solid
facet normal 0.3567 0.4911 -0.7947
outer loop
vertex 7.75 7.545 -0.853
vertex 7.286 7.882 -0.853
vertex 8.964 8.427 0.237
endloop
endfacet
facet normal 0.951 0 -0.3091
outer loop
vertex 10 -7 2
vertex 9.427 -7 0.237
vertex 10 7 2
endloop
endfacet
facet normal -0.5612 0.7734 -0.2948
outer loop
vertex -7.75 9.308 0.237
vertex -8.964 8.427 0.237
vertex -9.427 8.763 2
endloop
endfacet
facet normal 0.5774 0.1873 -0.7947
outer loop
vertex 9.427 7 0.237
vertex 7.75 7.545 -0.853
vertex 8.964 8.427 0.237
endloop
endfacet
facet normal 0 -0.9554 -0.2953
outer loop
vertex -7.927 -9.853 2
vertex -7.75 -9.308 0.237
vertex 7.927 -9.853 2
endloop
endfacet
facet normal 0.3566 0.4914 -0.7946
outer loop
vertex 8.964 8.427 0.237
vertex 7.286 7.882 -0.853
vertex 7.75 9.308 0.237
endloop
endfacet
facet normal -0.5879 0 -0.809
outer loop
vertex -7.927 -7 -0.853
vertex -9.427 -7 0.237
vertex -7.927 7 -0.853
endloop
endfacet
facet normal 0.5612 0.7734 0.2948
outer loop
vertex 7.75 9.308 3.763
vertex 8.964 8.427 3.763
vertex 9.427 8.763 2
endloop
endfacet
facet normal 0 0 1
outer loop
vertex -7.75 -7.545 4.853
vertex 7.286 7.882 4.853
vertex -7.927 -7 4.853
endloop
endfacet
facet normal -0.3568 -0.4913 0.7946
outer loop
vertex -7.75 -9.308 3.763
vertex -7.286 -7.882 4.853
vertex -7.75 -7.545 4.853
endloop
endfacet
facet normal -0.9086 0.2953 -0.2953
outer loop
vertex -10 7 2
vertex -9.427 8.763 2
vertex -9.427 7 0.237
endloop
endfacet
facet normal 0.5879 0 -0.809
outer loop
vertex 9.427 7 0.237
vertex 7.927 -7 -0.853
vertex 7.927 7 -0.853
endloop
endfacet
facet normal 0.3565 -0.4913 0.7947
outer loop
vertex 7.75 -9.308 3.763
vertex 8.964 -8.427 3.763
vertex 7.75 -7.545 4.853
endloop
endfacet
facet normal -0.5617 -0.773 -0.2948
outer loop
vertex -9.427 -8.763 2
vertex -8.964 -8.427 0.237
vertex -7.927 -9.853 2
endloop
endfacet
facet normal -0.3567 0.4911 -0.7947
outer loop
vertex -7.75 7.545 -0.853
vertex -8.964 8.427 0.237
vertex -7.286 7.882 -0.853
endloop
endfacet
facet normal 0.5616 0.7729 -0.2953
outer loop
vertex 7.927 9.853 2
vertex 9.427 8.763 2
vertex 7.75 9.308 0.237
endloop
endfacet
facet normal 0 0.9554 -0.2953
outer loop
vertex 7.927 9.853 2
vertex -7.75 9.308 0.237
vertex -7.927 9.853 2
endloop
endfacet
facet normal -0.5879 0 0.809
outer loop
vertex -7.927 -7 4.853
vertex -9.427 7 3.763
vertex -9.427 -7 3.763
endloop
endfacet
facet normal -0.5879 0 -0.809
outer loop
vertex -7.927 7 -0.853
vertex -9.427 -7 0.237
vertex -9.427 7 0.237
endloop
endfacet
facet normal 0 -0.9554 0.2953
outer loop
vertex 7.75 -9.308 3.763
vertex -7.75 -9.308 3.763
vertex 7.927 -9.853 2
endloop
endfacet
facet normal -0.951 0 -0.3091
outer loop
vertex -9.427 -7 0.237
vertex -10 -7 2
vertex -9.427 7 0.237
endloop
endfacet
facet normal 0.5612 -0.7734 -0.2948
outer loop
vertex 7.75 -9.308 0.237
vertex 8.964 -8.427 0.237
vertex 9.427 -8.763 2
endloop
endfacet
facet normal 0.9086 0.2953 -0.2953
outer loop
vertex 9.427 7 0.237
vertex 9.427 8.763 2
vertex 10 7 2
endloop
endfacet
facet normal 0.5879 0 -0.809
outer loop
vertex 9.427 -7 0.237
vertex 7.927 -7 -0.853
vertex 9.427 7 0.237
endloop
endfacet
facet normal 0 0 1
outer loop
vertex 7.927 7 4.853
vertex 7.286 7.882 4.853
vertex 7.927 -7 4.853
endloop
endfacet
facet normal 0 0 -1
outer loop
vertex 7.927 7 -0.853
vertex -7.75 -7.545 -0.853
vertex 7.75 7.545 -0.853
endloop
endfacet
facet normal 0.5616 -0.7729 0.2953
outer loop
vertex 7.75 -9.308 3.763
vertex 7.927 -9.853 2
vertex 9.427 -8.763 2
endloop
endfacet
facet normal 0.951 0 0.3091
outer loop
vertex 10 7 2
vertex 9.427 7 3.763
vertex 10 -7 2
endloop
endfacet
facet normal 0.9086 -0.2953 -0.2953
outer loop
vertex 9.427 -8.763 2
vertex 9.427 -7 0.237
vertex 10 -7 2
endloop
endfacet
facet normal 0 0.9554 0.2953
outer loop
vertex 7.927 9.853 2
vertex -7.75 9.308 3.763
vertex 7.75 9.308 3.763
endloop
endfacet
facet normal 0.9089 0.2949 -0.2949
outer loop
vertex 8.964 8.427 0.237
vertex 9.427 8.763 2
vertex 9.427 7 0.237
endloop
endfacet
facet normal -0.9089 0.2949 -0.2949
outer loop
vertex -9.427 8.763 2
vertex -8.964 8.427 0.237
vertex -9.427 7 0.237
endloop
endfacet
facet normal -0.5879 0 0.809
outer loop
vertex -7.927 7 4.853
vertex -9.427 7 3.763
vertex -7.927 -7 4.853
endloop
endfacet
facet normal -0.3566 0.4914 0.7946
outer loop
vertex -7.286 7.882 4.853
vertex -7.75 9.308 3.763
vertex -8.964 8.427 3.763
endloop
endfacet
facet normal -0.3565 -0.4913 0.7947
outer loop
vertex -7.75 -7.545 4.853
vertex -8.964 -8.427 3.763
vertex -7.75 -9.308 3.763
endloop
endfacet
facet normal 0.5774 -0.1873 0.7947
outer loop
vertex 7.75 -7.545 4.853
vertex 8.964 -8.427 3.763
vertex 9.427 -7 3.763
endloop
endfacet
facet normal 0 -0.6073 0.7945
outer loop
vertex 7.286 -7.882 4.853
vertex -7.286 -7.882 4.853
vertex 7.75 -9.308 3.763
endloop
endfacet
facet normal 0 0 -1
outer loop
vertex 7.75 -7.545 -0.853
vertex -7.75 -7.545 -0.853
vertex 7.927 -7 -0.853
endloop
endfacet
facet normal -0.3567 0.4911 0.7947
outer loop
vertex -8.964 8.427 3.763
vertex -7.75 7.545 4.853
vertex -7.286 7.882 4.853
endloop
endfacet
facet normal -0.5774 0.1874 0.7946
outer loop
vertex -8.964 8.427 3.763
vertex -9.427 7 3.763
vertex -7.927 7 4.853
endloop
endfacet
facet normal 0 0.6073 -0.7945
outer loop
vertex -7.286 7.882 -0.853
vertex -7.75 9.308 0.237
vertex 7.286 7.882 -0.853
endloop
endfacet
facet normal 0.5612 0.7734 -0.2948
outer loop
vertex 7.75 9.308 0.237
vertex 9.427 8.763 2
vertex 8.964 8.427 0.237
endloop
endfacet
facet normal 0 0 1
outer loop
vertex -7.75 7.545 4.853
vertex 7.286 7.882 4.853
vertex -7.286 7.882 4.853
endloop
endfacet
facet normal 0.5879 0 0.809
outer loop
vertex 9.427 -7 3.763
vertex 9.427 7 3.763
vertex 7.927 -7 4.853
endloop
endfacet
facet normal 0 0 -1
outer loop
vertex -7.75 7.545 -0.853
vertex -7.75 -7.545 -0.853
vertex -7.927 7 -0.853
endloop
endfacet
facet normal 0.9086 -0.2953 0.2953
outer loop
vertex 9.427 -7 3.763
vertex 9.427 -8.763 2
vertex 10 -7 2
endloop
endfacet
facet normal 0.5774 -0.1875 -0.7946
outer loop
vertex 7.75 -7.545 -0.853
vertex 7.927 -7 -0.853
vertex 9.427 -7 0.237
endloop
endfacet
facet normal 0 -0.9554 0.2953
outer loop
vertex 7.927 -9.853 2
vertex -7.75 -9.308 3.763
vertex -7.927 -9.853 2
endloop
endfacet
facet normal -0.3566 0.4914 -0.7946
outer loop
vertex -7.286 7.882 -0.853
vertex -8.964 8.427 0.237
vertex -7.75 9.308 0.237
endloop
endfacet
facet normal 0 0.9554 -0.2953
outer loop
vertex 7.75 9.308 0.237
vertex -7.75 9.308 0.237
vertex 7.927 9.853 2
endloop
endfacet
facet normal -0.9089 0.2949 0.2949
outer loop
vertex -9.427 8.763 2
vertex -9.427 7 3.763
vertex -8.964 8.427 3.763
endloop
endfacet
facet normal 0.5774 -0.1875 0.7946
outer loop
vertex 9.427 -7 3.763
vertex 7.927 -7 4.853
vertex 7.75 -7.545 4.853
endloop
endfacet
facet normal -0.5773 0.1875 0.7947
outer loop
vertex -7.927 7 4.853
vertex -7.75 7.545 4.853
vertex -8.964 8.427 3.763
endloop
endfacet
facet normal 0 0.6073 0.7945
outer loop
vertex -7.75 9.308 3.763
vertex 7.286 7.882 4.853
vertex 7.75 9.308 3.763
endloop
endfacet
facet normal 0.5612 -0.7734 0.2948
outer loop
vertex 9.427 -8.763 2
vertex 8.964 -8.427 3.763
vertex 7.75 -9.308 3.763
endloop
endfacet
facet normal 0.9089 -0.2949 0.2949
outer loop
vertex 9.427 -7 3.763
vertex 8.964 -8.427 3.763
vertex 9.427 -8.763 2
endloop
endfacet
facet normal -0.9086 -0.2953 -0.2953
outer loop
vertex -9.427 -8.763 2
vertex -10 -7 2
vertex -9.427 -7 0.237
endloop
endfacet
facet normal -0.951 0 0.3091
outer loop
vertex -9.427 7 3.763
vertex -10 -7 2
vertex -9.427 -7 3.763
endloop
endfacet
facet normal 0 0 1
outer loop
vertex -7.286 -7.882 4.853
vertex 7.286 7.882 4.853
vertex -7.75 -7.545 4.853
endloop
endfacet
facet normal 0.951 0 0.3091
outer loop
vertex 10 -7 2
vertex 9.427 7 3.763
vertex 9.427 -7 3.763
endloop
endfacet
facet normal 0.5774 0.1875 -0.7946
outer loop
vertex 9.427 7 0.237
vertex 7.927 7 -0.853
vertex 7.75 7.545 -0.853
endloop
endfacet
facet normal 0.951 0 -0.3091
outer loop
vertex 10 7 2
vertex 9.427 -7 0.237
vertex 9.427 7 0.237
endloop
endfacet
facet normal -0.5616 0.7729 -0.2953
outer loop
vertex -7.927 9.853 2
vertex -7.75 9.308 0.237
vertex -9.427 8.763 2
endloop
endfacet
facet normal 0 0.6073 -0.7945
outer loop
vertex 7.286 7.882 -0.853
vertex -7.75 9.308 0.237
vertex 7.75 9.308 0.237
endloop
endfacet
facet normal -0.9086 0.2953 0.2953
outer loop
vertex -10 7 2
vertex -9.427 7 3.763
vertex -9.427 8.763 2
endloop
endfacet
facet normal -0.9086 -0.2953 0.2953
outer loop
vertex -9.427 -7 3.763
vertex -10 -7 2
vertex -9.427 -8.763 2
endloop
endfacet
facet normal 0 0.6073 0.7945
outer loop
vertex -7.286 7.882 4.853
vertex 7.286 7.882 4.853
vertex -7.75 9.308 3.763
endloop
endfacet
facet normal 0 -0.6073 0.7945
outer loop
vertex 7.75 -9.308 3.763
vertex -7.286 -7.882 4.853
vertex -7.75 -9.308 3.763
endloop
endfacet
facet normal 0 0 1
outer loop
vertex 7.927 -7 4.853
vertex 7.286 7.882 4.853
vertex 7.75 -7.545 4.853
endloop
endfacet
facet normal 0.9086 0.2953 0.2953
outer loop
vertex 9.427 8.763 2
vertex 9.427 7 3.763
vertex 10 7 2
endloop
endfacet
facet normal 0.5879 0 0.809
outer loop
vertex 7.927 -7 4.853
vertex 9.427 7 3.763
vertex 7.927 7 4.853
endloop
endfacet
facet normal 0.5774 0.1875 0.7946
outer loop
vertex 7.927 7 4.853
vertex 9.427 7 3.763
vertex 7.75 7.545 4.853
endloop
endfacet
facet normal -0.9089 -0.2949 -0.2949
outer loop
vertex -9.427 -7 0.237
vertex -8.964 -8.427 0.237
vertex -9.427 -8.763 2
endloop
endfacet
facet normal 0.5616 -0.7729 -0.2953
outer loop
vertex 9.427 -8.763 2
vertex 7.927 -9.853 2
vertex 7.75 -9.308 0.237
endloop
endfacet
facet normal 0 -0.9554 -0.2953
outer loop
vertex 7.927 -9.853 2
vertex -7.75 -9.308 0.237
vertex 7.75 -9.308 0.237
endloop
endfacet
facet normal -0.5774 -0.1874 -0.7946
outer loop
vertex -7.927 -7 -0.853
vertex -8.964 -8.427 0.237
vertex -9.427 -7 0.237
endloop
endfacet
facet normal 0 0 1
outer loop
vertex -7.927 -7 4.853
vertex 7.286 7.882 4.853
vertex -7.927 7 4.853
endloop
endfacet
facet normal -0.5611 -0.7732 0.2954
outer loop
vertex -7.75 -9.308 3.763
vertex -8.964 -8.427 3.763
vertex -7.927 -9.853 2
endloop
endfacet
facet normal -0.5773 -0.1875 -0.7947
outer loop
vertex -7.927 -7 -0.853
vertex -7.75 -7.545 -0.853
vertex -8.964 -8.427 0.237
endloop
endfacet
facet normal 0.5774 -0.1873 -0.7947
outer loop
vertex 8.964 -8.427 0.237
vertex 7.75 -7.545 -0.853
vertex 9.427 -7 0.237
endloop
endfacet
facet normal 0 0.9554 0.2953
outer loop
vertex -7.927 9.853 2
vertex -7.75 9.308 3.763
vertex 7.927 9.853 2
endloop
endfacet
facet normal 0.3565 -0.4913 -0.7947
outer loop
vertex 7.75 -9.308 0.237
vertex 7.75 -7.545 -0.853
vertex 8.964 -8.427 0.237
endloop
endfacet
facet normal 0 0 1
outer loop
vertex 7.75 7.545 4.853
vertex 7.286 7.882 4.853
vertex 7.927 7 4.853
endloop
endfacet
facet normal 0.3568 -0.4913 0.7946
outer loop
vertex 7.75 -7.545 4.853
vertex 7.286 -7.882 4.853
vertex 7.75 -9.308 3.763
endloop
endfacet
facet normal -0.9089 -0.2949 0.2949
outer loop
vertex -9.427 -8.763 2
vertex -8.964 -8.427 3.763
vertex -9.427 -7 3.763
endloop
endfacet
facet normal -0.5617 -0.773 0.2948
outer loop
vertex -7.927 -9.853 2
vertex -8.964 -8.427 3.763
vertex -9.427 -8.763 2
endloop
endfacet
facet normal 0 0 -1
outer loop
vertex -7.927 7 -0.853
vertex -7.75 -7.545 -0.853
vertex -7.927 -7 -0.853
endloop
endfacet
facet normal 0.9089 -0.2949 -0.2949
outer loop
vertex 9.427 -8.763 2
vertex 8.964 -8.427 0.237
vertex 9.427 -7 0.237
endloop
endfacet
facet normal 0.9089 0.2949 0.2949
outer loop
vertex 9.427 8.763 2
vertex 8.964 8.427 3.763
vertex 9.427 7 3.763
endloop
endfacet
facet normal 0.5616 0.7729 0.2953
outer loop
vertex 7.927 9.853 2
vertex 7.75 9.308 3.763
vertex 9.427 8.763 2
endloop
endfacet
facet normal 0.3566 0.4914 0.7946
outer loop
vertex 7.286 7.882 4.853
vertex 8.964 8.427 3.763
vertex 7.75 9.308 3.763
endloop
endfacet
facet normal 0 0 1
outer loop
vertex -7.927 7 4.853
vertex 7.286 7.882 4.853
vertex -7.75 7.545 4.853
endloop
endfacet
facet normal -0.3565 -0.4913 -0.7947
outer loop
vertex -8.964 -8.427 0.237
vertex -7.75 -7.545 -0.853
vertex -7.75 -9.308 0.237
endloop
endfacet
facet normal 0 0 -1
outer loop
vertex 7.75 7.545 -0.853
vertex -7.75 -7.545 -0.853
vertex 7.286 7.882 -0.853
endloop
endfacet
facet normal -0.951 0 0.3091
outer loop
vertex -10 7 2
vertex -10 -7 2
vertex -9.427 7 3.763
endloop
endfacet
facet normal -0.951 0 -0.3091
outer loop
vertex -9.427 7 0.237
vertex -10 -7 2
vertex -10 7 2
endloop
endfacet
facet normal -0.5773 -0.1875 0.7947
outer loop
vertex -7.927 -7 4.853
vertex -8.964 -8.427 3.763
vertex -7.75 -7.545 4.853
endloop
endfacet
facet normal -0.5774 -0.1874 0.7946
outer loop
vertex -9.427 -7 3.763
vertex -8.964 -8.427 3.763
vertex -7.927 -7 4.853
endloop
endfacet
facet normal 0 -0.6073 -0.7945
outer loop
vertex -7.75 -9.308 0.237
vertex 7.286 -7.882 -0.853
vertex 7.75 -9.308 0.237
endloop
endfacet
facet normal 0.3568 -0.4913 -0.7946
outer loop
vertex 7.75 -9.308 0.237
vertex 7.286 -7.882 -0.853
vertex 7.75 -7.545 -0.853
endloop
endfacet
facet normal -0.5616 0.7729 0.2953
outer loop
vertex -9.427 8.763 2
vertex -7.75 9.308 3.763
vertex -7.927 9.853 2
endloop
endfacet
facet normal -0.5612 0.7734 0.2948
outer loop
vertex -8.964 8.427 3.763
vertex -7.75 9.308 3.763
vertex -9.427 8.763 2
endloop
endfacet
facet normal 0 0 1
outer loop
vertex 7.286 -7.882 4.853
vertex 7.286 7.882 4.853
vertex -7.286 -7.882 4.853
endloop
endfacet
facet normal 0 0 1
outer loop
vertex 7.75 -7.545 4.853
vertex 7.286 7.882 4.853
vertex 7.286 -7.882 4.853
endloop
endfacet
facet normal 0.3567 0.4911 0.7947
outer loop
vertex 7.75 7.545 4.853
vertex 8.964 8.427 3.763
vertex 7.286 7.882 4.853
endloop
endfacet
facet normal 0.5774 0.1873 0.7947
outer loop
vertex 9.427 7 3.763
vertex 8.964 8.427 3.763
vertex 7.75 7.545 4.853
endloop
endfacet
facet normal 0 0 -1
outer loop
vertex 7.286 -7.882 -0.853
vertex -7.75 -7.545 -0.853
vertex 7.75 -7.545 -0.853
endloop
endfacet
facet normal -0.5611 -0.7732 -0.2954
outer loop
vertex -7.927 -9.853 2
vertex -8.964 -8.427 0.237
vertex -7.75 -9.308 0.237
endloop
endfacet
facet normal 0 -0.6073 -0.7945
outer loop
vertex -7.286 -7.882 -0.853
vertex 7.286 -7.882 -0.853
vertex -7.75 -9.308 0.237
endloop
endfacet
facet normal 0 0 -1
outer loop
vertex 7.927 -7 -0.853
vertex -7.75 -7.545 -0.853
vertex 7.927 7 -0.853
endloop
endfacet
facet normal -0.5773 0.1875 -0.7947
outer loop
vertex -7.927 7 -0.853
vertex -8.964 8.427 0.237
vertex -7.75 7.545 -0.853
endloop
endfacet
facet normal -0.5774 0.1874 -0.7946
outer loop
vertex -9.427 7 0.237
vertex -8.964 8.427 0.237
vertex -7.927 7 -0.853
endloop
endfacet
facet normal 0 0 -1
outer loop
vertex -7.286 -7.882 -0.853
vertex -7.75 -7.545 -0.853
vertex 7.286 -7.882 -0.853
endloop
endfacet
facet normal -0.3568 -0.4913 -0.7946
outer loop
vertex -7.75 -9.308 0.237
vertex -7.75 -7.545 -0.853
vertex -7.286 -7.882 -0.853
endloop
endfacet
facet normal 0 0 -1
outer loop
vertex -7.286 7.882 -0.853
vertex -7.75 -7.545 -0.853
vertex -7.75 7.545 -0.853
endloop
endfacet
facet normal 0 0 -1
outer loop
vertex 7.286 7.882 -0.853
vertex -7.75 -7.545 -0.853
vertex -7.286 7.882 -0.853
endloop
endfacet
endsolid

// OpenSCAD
x1y1z = [10, 10, 5];
x2y2 = [20,20];
r = 3;

top_rounded_block(x1y1z,x2y2,r);
module top_rounded_block(x1y1z,x2y2,r) {
	translate([-x1y1z[0]/2,-x1y1z[1]/2,0]) {
		hull() {
			translate([r,r,0]) cylinder(0.001,r,0);
			translate([x1y1z[0]-r,r,0]) cylinder(0.001,r,0);
			translate([r,x1y1z[1]-r,0]) cylinder(0.001,r,0);
			translate([x1y1z[0]-r,x1y1z[1]-r,0]) cylinder(0.001,r,0);
			
			translate([
				r+((x1y1z[0]-x2y2[0])/2),
				r+((x1y1z[1]-x2y2[1])/2),
				x1y1z[2]-r
			]) sphere(r);
			
			translate([
				x1y1z[0]-r-((x1y1z[0]-x2y2[0])/2),
				r+((x1y1z[1]-x2y2[1])/2),
				x1y1z[2]-r
			]) sphere(r);
			
			translate([
				r+((x1y1z[0]-x2y2[0])/2),
				x1y1z[1]-r-((x1y1z[1]-x2y2[1])/2),
				x1y1z[2]-r
			]) sphere(r);
			
			translate([
				x1y1z[0]-r-((x1y1z[0]-x2y2[0])/2),
				x1y1z[1]-r-((x1y1z[1]-x2y2[1])/2),
				x1y1z[2]-r
			]) sphere(r);
		}
	}

}
